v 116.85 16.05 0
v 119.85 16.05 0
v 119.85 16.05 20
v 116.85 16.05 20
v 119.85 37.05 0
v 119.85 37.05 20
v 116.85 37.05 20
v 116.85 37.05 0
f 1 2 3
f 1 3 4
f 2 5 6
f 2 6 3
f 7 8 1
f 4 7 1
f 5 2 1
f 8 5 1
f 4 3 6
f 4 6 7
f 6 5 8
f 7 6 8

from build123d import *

# Parameters (mm, degrees)
SKETCH005_W  = 3
SKETCH005_H  = 21
PAD005_DEPTH = 20


with BuildPart() as acr_side_fl:
    # Sketch005 → Pad005 (new body)
    with BuildSketch(Plane.XY):
        with Locations((-118.349828, -27.05)):
            Rectangle(SKETCH005_W, SKETCH005_H)
    extrude(amount=PAD005_DEPTH)


with BuildPart() as acr_side_bl:
    # Part__Mirroring006: instance of ACR_Side_FL
    add(acr_side_fl.part.mirror(Plane(origin=(0, 0, 0), x_dir=(1, 0, 0), z_dir=(0, 1, 0))))


with BuildPart() as acr_side_bl_1:
    # Part__Mirroring006 placement: moved
    add(acr_side_bl.part.moved(Location((0, -0.5, 0))))


with BuildPart() as acr_side_br:
    # Part__Mirroring008: instance of ACR_Side_BL
    add(acr_side_bl_1.part.mirror(Plane(origin=(0, 0, 0), x_dir=(0, -1, 0), z_dir=(1, 0, 0))))


solid = acr_side_br.part
